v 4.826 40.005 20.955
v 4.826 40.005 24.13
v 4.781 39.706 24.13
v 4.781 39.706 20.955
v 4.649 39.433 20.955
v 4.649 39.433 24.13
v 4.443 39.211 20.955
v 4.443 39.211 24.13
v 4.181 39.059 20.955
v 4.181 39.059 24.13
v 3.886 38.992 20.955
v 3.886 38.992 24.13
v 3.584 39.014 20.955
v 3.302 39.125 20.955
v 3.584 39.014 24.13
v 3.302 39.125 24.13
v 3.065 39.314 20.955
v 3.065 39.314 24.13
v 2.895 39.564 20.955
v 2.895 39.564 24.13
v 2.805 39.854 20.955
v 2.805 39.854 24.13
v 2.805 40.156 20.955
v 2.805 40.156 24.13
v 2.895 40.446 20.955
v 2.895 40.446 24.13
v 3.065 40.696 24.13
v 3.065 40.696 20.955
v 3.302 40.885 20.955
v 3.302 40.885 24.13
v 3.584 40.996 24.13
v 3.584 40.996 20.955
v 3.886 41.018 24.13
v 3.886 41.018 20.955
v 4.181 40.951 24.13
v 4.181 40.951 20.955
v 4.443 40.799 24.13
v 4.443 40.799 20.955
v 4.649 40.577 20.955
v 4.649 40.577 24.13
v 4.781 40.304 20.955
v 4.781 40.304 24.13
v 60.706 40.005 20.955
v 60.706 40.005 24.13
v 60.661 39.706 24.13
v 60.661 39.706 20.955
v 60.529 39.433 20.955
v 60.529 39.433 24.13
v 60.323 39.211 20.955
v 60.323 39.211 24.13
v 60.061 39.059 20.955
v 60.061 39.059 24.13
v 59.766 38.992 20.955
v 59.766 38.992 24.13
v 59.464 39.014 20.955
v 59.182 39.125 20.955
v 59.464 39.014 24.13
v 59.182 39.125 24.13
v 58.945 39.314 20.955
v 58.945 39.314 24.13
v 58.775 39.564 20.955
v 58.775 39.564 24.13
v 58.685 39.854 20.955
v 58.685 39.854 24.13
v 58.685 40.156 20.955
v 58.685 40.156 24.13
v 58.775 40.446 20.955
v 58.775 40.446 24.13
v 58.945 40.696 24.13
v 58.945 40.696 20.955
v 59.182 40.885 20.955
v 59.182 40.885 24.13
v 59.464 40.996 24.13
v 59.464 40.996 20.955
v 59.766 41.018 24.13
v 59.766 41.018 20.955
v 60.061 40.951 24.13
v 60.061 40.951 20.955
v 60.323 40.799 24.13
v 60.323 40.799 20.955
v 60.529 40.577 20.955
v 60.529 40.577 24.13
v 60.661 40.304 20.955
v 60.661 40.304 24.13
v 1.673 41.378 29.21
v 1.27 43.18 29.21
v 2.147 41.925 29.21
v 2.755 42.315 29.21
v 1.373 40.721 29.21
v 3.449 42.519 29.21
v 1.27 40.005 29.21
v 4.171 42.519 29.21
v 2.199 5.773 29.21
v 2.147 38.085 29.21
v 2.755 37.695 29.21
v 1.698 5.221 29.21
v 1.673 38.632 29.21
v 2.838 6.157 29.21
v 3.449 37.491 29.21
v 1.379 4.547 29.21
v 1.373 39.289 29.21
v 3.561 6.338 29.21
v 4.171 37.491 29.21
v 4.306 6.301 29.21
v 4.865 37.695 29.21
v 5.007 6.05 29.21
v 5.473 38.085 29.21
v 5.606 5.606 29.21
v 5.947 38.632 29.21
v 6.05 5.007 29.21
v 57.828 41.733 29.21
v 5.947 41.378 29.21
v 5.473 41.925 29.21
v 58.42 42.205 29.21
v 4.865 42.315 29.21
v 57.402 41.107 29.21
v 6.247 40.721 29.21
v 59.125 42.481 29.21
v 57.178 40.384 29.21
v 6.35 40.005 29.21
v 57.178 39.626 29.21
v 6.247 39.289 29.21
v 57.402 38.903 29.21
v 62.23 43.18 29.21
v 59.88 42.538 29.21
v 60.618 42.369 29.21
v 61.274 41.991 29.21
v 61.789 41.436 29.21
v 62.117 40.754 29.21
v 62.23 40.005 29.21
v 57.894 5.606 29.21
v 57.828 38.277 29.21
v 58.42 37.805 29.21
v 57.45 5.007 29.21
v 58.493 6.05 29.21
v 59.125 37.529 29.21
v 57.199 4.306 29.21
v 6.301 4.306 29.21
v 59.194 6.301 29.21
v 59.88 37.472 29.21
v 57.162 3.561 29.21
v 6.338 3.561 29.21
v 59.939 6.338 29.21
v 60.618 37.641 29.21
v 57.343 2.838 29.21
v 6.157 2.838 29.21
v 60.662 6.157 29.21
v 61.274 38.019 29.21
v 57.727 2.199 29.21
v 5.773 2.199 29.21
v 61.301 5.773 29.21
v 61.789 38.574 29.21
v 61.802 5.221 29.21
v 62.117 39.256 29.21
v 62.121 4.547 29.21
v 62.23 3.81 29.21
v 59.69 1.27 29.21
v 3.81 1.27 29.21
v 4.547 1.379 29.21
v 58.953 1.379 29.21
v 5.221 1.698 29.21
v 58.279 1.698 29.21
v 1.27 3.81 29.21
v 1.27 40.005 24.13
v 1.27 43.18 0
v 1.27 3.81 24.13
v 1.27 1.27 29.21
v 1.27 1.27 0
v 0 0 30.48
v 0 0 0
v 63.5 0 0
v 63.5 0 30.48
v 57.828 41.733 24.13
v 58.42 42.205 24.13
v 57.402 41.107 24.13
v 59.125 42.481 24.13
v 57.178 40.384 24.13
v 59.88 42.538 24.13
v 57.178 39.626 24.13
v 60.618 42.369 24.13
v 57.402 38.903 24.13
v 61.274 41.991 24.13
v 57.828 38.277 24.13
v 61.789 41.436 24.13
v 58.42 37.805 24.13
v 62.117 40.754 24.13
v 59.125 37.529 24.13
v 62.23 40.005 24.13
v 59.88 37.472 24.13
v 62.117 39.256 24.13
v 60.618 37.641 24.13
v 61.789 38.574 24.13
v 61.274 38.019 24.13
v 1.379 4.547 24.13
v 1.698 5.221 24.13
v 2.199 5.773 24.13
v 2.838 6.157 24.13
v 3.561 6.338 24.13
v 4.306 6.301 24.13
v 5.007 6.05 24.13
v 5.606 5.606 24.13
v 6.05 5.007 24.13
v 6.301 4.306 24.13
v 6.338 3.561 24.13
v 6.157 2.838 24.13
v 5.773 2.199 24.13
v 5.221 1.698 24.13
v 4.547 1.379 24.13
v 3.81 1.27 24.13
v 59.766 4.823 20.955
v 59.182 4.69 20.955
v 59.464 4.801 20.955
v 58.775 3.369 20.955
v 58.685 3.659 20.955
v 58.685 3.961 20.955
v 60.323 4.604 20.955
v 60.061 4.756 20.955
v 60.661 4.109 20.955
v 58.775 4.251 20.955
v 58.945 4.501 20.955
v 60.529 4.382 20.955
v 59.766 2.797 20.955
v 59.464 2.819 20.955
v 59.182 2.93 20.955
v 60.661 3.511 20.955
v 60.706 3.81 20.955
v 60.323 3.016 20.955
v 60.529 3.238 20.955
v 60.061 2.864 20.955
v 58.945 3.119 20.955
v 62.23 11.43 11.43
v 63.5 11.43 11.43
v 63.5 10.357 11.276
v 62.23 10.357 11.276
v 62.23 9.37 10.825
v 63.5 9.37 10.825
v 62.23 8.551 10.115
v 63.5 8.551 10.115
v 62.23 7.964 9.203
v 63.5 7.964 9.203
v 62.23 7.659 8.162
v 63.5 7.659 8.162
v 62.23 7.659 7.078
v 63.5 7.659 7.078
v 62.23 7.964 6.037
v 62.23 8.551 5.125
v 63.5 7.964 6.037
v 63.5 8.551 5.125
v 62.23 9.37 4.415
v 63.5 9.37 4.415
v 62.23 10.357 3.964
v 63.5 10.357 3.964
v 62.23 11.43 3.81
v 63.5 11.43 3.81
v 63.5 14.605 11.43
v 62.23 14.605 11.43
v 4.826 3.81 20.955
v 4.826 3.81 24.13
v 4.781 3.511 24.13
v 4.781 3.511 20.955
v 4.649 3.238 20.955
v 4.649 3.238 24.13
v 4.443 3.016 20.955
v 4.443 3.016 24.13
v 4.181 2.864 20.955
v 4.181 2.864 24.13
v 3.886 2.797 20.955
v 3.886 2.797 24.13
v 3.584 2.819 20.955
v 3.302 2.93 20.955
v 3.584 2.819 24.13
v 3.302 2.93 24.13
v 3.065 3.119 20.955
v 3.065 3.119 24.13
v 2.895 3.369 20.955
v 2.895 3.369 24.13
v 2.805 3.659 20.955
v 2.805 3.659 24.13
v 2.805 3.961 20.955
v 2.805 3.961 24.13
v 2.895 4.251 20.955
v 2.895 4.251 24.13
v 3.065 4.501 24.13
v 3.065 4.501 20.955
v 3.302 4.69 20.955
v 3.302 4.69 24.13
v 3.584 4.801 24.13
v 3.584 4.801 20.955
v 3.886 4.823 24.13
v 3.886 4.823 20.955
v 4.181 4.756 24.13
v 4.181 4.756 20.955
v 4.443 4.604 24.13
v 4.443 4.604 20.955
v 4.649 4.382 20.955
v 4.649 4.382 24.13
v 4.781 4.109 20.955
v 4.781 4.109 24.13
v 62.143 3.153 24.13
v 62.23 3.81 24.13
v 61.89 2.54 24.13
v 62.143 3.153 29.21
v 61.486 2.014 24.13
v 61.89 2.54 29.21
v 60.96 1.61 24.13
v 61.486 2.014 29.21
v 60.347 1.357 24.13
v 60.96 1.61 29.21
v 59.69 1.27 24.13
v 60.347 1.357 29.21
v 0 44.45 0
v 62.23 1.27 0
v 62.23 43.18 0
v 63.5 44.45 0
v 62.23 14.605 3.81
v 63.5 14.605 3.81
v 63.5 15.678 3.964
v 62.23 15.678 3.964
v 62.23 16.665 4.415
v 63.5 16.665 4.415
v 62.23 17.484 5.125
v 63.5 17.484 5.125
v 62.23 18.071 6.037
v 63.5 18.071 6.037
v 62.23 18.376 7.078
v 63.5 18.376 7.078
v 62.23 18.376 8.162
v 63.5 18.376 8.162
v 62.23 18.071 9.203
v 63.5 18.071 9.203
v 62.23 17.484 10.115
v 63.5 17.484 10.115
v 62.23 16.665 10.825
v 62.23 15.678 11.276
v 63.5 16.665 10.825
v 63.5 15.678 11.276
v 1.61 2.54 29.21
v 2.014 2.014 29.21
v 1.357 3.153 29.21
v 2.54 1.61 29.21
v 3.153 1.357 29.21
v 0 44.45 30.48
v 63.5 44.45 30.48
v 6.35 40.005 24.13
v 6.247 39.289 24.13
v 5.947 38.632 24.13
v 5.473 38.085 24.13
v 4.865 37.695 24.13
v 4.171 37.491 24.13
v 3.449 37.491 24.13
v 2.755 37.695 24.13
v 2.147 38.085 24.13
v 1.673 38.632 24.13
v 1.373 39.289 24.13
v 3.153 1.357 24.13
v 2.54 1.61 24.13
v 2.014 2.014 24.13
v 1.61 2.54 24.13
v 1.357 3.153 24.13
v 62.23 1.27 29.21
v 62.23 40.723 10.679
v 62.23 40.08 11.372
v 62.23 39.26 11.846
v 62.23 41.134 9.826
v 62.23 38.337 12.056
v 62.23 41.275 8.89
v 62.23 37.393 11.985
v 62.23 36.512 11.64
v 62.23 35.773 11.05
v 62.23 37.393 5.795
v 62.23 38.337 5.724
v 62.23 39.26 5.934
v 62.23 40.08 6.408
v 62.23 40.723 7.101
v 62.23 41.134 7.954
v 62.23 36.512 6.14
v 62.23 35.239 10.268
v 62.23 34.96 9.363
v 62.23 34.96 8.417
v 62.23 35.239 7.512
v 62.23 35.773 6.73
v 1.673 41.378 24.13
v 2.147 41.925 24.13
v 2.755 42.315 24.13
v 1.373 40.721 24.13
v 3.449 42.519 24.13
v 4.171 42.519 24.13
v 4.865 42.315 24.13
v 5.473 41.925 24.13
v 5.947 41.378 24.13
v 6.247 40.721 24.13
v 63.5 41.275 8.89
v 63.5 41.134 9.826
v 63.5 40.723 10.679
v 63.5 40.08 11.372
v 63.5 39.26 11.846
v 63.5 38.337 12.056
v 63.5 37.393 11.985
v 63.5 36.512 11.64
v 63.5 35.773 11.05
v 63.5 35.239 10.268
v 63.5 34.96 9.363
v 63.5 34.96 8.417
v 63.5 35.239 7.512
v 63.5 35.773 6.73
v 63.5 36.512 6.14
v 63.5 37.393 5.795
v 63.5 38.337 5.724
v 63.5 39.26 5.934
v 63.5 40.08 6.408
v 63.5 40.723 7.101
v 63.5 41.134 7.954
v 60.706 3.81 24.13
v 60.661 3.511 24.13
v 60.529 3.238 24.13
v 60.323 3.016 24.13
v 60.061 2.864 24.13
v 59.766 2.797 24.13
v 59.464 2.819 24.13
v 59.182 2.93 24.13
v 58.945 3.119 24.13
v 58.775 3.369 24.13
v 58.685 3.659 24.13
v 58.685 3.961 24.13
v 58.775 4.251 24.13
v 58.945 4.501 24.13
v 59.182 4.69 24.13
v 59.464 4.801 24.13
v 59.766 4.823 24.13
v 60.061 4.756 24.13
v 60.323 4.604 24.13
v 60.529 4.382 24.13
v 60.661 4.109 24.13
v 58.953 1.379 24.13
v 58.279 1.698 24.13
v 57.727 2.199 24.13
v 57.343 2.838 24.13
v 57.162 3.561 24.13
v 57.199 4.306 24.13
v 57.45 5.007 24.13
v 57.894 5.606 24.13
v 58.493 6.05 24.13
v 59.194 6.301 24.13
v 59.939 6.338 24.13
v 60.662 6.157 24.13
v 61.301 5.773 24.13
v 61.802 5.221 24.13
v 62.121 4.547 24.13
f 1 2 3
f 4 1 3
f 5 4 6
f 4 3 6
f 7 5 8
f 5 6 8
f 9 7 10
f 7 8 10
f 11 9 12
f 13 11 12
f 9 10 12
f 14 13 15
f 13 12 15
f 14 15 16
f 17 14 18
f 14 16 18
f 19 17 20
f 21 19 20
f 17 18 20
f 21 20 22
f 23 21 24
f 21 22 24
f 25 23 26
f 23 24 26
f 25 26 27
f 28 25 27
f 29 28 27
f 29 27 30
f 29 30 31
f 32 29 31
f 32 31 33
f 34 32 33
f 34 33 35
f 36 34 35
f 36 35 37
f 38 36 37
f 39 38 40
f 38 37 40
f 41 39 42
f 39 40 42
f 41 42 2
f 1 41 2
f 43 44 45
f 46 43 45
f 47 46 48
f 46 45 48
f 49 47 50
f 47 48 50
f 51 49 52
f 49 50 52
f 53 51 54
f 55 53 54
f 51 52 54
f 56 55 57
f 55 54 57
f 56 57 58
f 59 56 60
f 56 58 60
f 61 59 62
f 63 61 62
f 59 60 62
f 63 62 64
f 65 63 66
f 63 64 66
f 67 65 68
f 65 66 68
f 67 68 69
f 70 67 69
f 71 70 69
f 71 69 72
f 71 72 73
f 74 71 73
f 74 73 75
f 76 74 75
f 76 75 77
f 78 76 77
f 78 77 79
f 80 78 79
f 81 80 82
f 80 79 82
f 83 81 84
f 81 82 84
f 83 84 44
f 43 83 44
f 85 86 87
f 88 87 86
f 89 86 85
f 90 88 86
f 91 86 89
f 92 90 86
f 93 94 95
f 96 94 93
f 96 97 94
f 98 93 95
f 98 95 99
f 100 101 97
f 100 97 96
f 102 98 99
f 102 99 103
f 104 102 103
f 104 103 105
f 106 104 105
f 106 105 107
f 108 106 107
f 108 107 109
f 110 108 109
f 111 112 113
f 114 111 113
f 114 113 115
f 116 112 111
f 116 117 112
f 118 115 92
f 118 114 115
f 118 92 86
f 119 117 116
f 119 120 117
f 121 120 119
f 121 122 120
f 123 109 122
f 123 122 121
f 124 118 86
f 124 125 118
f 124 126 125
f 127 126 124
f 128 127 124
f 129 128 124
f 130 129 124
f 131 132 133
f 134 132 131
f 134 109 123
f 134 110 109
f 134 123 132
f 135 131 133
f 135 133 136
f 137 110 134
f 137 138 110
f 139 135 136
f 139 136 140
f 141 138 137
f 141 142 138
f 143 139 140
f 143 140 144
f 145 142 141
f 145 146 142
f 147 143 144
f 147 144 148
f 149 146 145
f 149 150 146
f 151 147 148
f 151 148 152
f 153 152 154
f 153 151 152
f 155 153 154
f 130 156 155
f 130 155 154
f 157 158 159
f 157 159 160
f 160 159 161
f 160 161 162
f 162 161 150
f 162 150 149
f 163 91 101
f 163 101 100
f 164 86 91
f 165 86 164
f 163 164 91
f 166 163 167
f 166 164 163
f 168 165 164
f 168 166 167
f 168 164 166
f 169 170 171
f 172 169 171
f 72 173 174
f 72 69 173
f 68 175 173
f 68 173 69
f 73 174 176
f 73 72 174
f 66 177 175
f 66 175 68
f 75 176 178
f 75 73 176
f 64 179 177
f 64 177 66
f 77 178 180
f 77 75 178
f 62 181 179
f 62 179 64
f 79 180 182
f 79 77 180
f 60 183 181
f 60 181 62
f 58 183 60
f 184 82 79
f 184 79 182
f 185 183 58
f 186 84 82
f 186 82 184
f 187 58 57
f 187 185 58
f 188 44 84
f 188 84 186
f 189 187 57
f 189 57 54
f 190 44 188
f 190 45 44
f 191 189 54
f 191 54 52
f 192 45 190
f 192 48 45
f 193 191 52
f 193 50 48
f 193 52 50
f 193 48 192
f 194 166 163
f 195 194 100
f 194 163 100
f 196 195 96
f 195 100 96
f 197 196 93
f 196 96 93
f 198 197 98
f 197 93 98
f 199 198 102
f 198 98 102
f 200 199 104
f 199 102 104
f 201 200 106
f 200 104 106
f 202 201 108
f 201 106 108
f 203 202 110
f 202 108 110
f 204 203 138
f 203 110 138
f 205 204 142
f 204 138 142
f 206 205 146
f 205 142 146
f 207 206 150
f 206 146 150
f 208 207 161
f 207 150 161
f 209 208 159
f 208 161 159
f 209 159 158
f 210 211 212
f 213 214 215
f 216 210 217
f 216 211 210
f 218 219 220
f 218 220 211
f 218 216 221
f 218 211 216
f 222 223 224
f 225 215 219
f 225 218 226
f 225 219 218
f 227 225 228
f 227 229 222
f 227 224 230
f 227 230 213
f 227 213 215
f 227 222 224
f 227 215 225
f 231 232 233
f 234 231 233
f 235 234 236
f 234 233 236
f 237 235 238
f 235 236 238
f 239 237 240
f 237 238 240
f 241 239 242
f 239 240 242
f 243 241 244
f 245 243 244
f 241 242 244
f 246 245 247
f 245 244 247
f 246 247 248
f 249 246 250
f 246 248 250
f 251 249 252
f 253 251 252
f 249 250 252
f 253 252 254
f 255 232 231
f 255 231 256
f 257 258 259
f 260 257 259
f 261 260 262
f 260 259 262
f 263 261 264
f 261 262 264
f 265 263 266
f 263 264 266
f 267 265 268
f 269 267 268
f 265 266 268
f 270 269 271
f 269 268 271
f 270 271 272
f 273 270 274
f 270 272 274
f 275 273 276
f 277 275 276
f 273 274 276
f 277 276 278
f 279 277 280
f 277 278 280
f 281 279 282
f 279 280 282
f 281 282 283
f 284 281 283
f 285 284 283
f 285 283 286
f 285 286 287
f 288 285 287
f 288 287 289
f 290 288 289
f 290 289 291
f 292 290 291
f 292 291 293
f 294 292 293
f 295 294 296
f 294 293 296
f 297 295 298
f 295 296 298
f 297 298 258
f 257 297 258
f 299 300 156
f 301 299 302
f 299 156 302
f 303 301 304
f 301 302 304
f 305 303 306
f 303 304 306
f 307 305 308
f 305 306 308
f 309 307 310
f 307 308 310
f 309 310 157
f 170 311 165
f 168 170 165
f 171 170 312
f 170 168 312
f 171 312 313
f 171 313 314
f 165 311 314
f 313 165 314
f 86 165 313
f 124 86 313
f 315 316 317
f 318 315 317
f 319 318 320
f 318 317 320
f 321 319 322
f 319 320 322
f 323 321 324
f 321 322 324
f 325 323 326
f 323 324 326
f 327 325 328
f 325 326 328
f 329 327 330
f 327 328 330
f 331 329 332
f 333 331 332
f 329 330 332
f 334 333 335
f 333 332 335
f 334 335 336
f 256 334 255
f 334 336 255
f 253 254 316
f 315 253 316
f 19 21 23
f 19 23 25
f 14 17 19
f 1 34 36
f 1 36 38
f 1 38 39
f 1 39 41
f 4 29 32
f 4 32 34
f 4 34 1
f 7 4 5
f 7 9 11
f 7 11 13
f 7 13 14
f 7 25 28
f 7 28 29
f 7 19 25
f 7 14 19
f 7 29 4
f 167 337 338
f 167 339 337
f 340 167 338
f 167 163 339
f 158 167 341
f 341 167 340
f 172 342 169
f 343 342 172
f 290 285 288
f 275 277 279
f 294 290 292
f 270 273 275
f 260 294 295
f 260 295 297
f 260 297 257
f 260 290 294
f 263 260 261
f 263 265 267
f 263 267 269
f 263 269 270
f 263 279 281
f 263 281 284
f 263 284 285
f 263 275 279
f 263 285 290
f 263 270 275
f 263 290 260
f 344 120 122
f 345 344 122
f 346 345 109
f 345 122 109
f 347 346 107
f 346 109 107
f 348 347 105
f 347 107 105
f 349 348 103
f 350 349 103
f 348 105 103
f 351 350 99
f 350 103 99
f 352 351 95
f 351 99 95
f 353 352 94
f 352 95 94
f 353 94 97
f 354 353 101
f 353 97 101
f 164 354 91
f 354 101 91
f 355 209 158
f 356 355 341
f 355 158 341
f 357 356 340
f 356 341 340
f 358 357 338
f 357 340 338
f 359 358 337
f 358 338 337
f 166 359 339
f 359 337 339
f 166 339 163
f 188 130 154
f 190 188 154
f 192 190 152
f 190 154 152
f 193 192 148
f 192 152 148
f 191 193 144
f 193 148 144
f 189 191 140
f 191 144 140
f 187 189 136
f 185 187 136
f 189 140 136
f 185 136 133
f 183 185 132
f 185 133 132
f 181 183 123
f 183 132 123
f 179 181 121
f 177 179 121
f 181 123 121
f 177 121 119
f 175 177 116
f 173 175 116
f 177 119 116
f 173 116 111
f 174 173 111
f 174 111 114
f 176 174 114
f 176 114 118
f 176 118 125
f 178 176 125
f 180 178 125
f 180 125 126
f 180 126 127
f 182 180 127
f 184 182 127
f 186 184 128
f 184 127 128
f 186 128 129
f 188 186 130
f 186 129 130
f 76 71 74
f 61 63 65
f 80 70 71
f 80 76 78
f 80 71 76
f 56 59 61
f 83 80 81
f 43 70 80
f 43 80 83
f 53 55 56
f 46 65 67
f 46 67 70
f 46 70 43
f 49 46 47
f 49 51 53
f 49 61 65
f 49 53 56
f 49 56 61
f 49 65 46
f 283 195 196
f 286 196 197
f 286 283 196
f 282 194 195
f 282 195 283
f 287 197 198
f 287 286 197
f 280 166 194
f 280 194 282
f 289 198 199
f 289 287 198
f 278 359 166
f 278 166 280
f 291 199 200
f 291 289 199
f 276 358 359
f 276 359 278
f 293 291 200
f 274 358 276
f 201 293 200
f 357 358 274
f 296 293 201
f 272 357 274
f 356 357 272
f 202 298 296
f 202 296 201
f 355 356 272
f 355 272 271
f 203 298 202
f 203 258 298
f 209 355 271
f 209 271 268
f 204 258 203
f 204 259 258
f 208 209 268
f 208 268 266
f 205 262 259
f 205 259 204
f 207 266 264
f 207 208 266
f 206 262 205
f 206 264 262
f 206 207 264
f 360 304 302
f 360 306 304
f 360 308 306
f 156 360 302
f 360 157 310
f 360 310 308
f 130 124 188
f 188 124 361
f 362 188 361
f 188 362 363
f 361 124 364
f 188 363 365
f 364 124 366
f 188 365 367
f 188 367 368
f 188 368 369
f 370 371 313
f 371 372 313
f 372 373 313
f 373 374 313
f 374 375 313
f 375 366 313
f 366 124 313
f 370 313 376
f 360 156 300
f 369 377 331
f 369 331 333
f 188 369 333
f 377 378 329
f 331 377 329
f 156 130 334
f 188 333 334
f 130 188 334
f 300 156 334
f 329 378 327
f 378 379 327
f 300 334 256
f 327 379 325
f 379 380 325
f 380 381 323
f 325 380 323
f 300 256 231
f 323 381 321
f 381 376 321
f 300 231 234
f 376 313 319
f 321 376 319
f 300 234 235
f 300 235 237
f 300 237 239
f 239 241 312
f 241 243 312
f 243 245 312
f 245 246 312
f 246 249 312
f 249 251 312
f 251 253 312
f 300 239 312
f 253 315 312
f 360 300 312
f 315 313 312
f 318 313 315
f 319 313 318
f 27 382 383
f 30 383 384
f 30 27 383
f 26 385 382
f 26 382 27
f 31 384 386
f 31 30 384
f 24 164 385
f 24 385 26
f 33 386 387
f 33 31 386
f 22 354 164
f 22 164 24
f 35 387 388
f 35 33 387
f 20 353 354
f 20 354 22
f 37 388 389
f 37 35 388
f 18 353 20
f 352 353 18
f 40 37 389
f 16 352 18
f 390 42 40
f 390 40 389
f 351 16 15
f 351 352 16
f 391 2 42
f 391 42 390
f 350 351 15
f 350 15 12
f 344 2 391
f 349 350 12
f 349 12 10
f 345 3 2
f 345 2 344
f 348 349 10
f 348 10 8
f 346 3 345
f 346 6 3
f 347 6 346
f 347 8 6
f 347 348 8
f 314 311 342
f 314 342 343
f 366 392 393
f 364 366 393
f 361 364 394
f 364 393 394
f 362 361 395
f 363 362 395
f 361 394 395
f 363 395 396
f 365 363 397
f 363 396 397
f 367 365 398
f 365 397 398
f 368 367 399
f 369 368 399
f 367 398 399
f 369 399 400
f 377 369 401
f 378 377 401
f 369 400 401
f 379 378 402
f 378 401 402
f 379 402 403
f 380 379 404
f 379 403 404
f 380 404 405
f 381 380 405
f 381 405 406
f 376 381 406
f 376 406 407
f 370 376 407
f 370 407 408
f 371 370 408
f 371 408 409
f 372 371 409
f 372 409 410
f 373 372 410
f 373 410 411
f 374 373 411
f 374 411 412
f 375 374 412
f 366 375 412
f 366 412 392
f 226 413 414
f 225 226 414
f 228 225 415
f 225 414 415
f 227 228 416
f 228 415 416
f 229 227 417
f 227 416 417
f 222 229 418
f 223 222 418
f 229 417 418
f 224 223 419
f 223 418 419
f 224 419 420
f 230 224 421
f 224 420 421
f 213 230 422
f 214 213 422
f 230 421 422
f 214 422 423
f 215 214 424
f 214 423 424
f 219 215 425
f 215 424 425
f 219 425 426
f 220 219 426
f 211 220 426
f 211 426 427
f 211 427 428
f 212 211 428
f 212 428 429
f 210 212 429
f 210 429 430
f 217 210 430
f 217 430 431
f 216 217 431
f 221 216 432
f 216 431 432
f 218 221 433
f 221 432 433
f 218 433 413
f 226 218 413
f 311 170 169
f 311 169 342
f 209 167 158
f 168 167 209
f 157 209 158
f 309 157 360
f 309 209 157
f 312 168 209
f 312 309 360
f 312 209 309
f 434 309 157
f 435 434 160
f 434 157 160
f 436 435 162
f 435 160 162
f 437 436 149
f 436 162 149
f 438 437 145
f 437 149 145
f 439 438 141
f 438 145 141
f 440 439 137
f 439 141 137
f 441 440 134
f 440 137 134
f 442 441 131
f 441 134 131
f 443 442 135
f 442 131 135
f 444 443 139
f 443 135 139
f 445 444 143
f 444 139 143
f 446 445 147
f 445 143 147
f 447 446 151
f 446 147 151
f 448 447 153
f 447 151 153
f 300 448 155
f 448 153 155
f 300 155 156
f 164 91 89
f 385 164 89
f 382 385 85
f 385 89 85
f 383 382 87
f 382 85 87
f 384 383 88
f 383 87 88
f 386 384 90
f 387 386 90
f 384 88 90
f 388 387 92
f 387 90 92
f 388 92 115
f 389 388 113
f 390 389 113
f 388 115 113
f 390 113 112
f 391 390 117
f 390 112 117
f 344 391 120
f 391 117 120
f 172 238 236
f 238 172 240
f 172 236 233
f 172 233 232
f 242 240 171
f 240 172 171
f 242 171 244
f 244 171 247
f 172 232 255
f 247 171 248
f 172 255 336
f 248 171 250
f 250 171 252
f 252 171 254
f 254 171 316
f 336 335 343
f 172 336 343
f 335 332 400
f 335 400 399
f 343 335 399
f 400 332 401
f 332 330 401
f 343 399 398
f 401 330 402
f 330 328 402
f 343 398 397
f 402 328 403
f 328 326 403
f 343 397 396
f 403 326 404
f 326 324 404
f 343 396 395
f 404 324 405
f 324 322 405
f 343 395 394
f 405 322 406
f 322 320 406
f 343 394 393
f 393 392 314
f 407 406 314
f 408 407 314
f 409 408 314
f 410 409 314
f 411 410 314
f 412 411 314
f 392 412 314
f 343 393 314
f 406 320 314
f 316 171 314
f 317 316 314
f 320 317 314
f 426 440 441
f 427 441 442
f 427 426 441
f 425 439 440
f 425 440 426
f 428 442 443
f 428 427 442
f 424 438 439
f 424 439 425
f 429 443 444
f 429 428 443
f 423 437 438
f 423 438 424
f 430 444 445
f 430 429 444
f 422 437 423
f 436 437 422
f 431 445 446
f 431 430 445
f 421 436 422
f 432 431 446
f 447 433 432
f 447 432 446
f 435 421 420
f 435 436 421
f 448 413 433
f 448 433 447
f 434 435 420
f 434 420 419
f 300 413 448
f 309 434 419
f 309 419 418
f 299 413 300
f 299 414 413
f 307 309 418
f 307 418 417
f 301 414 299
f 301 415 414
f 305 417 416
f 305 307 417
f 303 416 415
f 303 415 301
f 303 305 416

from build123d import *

# Parameters (mm, degrees)
SKETCH_W        = 63.5
SKETCH_H        = 44.45
PAD_DEPTH       = 30.48
SKETCH001_W     = 60.96
SKETCH001_H     = 41.91
POCKET_DEPTH    = 29.21
SKETCH002_R     = 2.54
PAD001_DEPTH    = 5.08
SKETCH003_R     = 3.175
POCKET001_DEPTH = 5
COPYSKETCH004_R = 1.016
PAD002_DEPTH    = 3.175


with BuildPart() as part:
    # Sketch → Pad (new body)
    with BuildSketch(Plane.XY):
        with Locations((31.75, 22.225)):
            Rectangle(SKETCH_W, SKETCH_H)
    extrude(amount=PAD_DEPTH)

    # Sketch001 (on Face5 of Pad) → Pocket (cut)
    with BuildSketch(Plane(origin=(0, 0, 0), x_dir=(1, 0, 0), z_dir=(0, 0, -1))):
        with Locations((31.75, -22.225)):
            Rectangle(SKETCH001_W, SKETCH001_H)
    extrude(amount=-POCKET_DEPTH, mode=Mode.SUBTRACT)

    # Sketch002 (on Face11 of Pocket) → Pad001 (join)
    with BuildSketch(Plane(origin=(0, 0, 29.21), x_dir=(1, 0, 0), z_dir=(0, 0, -1))):
        with Locations((3.81, -40.005)):
            Circle(SKETCH002_R)
        with Locations((59.69, -40.005)):
            Circle(SKETCH002_R)
        with Locations((3.81, -3.81)):
            Circle(SKETCH002_R)
        with Locations((59.69, -3.81)):
            Circle(SKETCH002_R)
    extrude(amount=PAD001_DEPTH)

    # Sketch003 (on Face3 of Pad001) → Pocket001 (cut)
    with BuildSketch(Plane.YZ.offset(63.5)):
        with Locations((38.1, 8.89)):
            Circle(SKETCH003_R)
        with BuildLine():
            ThreePointArc((11.43, 11.43), (7.62, 7.62), (11.43, 3.81))
            Line((11.43, 3.81), (14.605, 3.81))
            ThreePointArc((14.605, 3.81), (18.415, 7.62), (14.605, 11.43))
            Line((11.43, 11.43), (14.605, 11.43))
        make_face()
    extrude(amount=-POCKET001_DEPTH, mode=Mode.SUBTRACT)

    # CopySketch004 → Pad002 (join)
    with BuildSketch(Plane(origin=(0, 0, 24.13), x_dir=(1, 0, 0), z_dir=(0, 0, -1))):
        with Locations((3.81, -40.005)):
            Circle(COPYSKETCH004_R)
        with Locations((3.81, -3.81)):
            Circle(COPYSKETCH004_R)
        with Locations((59.69, -3.81)):
            Circle(COPYSKETCH004_R)
        with Locations((59.69, -40.005)):
            Circle(COPYSKETCH004_R)
    extrude(amount=PAD002_DEPTH)


solid = part.part
